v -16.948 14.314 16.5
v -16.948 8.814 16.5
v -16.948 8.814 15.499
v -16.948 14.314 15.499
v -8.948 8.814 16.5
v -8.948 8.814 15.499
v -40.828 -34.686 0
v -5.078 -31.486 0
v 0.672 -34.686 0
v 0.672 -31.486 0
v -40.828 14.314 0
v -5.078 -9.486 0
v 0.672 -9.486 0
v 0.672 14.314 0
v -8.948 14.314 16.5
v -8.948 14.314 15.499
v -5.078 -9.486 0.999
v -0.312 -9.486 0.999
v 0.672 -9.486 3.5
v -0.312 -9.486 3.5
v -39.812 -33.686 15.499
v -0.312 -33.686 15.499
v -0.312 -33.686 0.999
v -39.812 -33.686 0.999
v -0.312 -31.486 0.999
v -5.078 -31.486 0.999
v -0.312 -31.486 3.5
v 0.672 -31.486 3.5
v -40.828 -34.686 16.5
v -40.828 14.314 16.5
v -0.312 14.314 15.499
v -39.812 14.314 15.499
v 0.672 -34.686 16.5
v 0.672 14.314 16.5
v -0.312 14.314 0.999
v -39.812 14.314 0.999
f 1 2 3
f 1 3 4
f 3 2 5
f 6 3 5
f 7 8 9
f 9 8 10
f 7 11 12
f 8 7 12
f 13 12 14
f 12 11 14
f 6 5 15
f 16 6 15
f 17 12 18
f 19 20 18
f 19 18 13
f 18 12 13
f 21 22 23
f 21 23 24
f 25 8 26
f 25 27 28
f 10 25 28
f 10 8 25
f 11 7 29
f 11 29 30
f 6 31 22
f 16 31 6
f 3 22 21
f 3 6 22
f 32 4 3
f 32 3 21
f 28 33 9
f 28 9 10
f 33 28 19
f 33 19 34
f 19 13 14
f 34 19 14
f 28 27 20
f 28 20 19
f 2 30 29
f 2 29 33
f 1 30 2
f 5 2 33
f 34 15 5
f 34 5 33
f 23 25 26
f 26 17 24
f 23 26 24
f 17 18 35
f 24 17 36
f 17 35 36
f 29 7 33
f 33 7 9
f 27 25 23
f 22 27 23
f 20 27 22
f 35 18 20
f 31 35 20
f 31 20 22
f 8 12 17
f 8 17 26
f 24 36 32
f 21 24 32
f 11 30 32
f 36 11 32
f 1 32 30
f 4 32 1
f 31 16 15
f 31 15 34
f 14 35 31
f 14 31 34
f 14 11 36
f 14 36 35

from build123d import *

# Parameters (mm, degrees)
F0_W     = 41.5
F0_H     = 49
F1_DEPTH = 16.5
F2_W     = 39.5
F2_H     = 14.5
F3_DEPTH = 48
F4_W     = 8
F4_H     = 5.5
F5_DEPTH = 1.000984
F6_W     = 5.75
F6_H     = 22
F7_DEPTH = 3.5


with BuildPart() as f1:
    # F0 (on Top) → F1 (new body)
    with BuildSketch(Plane.XY):
        with Locations((-20.077741, -10.186185)):
            Rectangle(F0_W, F0_H)
    extrude(amount=F1_DEPTH)

    # F2 (on face) → F3 (cut)
    with BuildSketch(Plane(origin=(0, 14.313815, 0), x_dir=(-1, 0, 0), z_dir=(0, 1, 0))):
        with Locations((20.061721, 8.249016)):
            Rectangle(F2_W, F2_H)
    extrude(amount=-F3_DEPTH, mode=Mode.SUBTRACT)

    # F4 (on face) → F5 (cut, through all)
    with BuildSketch(Plane.XY.offset(16.5)):
        with Locations((-12.947741, 11.563815)):
            Rectangle(F4_W, F4_H)
    extrude(amount=-F5_DEPTH, mode=Mode.SUBTRACT)

    # F6 (on face) → F7 (cut)
    with BuildSketch(Plane(origin=(0, 0, 0), x_dir=(1, 0, 0), z_dir=(0, 0, -1))):
        with Locations((-2.202741, 20.486185)):
            Rectangle(F6_W, F6_H)
    extrude(amount=-F7_DEPTH, mode=Mode.SUBTRACT)


solid = f1.part
